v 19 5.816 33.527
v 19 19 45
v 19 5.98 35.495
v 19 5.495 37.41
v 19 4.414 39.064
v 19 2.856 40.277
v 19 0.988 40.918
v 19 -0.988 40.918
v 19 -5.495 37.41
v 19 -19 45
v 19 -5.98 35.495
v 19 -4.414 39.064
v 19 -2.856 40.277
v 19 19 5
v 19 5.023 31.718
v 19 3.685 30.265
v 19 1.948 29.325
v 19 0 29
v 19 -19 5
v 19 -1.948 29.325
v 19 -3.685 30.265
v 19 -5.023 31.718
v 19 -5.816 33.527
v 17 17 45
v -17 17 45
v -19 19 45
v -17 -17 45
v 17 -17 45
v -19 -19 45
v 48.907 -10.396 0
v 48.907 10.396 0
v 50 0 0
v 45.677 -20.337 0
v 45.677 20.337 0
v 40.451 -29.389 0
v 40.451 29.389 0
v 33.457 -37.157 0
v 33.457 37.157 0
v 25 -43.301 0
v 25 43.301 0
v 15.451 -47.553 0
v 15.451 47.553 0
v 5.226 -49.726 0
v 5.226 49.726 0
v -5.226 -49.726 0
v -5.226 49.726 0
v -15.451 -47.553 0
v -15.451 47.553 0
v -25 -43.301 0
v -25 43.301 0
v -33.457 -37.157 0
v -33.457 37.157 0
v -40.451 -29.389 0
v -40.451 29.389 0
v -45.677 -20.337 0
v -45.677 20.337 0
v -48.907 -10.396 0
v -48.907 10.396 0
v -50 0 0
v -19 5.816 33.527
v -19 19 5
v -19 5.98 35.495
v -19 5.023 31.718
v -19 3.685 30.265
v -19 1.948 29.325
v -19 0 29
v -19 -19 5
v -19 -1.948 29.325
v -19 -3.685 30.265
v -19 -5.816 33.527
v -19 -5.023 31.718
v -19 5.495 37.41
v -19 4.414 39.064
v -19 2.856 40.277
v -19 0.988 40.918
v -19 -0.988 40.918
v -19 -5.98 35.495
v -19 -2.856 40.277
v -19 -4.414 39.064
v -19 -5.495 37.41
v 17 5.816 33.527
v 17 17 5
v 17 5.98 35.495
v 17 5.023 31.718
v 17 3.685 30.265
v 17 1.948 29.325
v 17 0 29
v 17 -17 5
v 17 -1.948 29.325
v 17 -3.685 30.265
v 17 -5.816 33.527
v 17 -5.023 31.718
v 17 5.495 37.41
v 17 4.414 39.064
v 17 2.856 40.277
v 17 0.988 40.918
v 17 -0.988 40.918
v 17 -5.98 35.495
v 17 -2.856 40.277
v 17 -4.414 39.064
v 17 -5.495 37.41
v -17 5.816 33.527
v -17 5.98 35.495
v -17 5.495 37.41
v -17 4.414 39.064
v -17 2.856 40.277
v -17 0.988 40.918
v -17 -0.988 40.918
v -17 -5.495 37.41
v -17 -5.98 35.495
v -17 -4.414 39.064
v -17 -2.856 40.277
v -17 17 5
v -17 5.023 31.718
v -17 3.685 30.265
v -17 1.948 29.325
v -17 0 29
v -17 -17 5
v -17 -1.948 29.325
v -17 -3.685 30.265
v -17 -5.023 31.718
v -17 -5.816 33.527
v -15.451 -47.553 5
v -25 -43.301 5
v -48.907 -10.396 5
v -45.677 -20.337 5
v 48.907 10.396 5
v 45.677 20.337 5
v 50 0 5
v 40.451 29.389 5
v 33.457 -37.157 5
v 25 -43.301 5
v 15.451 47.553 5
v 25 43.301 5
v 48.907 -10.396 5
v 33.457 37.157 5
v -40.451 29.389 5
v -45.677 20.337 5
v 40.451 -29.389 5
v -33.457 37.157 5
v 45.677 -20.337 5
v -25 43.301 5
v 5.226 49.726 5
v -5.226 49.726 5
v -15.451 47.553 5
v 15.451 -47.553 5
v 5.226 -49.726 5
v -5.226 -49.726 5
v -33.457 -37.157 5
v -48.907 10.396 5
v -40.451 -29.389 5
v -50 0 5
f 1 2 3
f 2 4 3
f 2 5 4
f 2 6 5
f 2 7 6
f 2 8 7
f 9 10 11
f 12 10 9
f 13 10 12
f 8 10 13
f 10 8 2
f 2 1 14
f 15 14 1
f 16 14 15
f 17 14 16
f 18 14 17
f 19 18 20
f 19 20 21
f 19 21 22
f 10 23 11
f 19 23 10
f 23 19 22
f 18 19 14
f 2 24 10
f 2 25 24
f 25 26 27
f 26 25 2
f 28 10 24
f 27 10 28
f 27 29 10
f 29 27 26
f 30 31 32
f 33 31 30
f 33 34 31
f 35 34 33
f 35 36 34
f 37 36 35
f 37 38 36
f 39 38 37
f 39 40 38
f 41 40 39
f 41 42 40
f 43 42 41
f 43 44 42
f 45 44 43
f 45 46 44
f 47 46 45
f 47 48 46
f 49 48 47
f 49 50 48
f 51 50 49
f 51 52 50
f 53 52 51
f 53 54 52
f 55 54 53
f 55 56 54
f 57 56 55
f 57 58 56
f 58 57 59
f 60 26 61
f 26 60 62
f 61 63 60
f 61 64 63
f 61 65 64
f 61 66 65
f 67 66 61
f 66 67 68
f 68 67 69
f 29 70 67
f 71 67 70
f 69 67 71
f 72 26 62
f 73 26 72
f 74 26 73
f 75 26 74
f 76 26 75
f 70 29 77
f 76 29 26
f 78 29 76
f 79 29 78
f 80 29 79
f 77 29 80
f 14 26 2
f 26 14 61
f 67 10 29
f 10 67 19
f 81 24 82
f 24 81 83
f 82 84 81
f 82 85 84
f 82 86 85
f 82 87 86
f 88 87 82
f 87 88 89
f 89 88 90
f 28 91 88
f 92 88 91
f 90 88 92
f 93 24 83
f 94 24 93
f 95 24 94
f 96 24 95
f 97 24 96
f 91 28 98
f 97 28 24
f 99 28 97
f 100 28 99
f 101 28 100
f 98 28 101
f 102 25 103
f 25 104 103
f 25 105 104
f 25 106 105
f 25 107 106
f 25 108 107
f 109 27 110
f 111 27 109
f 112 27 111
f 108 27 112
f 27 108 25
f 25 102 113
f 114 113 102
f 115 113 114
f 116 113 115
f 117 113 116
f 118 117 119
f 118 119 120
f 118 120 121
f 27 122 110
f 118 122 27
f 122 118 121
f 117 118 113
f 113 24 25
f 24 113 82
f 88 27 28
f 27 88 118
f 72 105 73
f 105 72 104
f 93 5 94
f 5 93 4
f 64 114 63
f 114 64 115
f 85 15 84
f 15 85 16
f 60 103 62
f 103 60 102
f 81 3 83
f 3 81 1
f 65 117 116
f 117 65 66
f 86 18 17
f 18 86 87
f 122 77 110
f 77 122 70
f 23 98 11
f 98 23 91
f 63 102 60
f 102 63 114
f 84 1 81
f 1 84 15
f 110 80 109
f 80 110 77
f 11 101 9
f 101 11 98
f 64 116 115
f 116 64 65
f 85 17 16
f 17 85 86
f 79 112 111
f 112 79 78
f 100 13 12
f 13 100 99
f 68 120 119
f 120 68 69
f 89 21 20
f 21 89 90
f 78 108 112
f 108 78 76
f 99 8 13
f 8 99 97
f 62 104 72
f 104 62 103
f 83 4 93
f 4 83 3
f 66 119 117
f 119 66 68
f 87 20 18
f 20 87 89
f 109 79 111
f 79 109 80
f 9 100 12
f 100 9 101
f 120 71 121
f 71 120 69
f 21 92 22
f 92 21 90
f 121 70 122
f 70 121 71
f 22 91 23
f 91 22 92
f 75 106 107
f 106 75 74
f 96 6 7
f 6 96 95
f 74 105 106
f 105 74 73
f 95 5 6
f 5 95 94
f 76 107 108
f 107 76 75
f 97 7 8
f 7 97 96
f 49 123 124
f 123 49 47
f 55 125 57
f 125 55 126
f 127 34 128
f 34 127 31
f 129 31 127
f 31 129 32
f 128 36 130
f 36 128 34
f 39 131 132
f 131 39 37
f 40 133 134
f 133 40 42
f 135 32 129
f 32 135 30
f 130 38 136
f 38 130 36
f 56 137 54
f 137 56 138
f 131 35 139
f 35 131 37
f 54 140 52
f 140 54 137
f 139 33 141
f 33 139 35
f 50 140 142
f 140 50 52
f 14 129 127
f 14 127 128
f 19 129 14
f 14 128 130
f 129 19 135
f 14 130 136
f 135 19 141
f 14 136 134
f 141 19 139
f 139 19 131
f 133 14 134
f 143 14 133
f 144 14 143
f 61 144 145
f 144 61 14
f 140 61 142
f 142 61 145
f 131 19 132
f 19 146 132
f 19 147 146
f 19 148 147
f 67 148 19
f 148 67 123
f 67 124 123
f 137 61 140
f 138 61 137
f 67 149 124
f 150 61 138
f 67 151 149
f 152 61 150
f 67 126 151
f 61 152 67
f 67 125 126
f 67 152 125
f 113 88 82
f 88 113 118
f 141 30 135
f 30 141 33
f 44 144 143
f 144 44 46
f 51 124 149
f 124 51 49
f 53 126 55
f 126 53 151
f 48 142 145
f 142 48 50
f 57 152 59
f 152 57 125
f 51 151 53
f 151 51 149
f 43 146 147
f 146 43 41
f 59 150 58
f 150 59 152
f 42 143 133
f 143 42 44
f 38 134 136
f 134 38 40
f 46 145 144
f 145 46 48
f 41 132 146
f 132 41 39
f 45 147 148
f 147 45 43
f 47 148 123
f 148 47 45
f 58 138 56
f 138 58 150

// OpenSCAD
module holder()
{
  cylinder(h=5, r=50);
  d=30+2*2;
  e=d+4;
  h=5+40;
  difference()
  {
    translate([-e/2, -e/2, 0])
      cube([e, e, h]);
    translate([-d/2, -d/2, 0])
      cube([d, d, h]);
    translate([-h/2, 0, h-10])
      rotate([0, 90, 0])
        cylinder(r=5+1, h=h);
  }
}

holder();
